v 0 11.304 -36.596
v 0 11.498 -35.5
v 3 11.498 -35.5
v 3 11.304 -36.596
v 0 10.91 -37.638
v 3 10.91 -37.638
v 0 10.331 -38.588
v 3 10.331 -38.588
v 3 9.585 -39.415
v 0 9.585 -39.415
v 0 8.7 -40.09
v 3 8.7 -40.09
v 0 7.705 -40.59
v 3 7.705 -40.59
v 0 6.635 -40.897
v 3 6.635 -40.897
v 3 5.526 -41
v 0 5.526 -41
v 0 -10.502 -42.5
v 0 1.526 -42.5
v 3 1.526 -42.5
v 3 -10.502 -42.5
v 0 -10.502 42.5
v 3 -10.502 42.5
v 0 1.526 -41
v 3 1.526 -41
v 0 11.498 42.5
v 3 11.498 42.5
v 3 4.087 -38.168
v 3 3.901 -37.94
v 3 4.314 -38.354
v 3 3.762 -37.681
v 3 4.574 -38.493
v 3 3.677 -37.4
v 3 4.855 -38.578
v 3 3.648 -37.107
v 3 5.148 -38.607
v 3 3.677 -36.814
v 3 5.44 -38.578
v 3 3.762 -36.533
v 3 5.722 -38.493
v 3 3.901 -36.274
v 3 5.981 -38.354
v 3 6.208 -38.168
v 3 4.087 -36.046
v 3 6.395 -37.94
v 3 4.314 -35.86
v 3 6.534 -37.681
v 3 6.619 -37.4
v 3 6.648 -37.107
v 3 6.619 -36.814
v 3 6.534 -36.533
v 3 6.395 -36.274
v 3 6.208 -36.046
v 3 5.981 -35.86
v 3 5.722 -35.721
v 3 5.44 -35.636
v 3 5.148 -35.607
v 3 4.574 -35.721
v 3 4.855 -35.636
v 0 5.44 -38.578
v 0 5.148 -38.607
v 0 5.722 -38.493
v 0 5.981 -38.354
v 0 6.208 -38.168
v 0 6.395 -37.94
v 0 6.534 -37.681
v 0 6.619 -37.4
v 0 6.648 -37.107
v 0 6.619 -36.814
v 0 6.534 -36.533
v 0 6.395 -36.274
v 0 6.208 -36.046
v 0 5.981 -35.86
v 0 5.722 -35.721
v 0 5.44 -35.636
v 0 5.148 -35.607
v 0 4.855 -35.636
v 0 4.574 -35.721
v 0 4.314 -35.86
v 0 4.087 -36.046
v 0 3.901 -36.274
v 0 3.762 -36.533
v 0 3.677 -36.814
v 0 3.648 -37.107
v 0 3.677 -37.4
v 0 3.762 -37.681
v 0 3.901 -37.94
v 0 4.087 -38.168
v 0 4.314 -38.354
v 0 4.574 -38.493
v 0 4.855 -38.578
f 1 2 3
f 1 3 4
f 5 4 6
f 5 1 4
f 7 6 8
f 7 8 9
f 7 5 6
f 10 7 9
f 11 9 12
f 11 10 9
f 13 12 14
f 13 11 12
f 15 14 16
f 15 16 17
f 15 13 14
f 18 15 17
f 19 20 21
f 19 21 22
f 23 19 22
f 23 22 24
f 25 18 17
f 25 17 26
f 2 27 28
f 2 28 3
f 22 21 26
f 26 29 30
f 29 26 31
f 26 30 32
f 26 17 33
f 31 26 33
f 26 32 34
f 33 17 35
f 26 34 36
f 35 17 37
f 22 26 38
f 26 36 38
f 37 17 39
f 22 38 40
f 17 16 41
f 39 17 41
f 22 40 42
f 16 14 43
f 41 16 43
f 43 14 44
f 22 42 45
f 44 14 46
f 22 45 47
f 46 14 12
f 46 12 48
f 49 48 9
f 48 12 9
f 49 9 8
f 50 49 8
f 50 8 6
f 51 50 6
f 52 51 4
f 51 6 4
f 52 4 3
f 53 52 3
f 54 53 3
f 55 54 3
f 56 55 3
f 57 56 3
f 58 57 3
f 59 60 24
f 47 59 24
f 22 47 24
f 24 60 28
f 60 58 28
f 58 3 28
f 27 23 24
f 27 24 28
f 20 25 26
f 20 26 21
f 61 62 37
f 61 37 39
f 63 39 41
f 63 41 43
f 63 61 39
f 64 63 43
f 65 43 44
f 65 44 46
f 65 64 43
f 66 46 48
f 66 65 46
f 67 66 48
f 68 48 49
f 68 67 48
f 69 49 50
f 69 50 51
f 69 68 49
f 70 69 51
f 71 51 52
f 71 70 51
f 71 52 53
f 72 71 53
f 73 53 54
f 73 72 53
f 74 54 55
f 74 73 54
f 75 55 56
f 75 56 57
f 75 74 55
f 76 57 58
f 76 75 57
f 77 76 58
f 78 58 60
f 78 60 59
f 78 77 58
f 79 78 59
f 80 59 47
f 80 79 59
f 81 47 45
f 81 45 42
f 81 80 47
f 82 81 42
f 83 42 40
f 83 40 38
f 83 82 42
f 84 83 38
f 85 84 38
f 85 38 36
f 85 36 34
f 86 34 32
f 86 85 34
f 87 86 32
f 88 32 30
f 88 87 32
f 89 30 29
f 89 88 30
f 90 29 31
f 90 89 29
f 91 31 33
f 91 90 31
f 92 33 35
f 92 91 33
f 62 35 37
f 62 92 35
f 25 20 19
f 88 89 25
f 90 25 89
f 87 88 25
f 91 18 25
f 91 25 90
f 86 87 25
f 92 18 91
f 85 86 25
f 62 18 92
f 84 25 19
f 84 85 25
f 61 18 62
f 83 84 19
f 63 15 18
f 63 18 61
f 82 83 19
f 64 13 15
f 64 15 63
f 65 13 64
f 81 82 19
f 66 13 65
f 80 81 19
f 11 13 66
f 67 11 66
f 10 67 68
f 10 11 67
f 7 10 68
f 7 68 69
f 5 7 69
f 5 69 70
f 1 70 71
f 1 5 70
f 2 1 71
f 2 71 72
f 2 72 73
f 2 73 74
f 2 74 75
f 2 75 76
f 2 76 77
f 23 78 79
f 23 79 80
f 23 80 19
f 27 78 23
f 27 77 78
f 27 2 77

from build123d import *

# Parameters (mm, degrees)
SKETCH1_R           = 1.5
BOSS_EXTRUDE1_DEPTH = 3


with BuildPart() as part:
    # Sketch1 → Boss-Extrude1 (new body)
    with BuildSketch(Plane(origin=(0, 0, 0), x_dir=(0, 0, -1), z_dir=(1, 0, 0))):
        with BuildLine():
            Line((41, 1.526420496), (42.5, 1.526420496))
            Line((42.5, 1.526420496), (42.5, -10.502465522))
            Line((42.5, -10.502465522), (-42.5, -10.502465522))
            Line((-42.5, -10.502465522), (-42.5, 11.497534478))
            Line((-42.5, 11.497534478), (35.5, 11.497534478))
            ThreePointArc((35.5, 11.497534478), (39.415467178, 9.585490654), (41, 5.526420496))
            Line((41, 5.526420496), (41, 1.526420496))
        make_face()
        with Locations((37.107006816, 5.147769804)):
            Circle(SKETCH1_R, mode=Mode.SUBTRACT)
    extrude(amount=BOSS_EXTRUDE1_DEPTH)


solid = part.part
